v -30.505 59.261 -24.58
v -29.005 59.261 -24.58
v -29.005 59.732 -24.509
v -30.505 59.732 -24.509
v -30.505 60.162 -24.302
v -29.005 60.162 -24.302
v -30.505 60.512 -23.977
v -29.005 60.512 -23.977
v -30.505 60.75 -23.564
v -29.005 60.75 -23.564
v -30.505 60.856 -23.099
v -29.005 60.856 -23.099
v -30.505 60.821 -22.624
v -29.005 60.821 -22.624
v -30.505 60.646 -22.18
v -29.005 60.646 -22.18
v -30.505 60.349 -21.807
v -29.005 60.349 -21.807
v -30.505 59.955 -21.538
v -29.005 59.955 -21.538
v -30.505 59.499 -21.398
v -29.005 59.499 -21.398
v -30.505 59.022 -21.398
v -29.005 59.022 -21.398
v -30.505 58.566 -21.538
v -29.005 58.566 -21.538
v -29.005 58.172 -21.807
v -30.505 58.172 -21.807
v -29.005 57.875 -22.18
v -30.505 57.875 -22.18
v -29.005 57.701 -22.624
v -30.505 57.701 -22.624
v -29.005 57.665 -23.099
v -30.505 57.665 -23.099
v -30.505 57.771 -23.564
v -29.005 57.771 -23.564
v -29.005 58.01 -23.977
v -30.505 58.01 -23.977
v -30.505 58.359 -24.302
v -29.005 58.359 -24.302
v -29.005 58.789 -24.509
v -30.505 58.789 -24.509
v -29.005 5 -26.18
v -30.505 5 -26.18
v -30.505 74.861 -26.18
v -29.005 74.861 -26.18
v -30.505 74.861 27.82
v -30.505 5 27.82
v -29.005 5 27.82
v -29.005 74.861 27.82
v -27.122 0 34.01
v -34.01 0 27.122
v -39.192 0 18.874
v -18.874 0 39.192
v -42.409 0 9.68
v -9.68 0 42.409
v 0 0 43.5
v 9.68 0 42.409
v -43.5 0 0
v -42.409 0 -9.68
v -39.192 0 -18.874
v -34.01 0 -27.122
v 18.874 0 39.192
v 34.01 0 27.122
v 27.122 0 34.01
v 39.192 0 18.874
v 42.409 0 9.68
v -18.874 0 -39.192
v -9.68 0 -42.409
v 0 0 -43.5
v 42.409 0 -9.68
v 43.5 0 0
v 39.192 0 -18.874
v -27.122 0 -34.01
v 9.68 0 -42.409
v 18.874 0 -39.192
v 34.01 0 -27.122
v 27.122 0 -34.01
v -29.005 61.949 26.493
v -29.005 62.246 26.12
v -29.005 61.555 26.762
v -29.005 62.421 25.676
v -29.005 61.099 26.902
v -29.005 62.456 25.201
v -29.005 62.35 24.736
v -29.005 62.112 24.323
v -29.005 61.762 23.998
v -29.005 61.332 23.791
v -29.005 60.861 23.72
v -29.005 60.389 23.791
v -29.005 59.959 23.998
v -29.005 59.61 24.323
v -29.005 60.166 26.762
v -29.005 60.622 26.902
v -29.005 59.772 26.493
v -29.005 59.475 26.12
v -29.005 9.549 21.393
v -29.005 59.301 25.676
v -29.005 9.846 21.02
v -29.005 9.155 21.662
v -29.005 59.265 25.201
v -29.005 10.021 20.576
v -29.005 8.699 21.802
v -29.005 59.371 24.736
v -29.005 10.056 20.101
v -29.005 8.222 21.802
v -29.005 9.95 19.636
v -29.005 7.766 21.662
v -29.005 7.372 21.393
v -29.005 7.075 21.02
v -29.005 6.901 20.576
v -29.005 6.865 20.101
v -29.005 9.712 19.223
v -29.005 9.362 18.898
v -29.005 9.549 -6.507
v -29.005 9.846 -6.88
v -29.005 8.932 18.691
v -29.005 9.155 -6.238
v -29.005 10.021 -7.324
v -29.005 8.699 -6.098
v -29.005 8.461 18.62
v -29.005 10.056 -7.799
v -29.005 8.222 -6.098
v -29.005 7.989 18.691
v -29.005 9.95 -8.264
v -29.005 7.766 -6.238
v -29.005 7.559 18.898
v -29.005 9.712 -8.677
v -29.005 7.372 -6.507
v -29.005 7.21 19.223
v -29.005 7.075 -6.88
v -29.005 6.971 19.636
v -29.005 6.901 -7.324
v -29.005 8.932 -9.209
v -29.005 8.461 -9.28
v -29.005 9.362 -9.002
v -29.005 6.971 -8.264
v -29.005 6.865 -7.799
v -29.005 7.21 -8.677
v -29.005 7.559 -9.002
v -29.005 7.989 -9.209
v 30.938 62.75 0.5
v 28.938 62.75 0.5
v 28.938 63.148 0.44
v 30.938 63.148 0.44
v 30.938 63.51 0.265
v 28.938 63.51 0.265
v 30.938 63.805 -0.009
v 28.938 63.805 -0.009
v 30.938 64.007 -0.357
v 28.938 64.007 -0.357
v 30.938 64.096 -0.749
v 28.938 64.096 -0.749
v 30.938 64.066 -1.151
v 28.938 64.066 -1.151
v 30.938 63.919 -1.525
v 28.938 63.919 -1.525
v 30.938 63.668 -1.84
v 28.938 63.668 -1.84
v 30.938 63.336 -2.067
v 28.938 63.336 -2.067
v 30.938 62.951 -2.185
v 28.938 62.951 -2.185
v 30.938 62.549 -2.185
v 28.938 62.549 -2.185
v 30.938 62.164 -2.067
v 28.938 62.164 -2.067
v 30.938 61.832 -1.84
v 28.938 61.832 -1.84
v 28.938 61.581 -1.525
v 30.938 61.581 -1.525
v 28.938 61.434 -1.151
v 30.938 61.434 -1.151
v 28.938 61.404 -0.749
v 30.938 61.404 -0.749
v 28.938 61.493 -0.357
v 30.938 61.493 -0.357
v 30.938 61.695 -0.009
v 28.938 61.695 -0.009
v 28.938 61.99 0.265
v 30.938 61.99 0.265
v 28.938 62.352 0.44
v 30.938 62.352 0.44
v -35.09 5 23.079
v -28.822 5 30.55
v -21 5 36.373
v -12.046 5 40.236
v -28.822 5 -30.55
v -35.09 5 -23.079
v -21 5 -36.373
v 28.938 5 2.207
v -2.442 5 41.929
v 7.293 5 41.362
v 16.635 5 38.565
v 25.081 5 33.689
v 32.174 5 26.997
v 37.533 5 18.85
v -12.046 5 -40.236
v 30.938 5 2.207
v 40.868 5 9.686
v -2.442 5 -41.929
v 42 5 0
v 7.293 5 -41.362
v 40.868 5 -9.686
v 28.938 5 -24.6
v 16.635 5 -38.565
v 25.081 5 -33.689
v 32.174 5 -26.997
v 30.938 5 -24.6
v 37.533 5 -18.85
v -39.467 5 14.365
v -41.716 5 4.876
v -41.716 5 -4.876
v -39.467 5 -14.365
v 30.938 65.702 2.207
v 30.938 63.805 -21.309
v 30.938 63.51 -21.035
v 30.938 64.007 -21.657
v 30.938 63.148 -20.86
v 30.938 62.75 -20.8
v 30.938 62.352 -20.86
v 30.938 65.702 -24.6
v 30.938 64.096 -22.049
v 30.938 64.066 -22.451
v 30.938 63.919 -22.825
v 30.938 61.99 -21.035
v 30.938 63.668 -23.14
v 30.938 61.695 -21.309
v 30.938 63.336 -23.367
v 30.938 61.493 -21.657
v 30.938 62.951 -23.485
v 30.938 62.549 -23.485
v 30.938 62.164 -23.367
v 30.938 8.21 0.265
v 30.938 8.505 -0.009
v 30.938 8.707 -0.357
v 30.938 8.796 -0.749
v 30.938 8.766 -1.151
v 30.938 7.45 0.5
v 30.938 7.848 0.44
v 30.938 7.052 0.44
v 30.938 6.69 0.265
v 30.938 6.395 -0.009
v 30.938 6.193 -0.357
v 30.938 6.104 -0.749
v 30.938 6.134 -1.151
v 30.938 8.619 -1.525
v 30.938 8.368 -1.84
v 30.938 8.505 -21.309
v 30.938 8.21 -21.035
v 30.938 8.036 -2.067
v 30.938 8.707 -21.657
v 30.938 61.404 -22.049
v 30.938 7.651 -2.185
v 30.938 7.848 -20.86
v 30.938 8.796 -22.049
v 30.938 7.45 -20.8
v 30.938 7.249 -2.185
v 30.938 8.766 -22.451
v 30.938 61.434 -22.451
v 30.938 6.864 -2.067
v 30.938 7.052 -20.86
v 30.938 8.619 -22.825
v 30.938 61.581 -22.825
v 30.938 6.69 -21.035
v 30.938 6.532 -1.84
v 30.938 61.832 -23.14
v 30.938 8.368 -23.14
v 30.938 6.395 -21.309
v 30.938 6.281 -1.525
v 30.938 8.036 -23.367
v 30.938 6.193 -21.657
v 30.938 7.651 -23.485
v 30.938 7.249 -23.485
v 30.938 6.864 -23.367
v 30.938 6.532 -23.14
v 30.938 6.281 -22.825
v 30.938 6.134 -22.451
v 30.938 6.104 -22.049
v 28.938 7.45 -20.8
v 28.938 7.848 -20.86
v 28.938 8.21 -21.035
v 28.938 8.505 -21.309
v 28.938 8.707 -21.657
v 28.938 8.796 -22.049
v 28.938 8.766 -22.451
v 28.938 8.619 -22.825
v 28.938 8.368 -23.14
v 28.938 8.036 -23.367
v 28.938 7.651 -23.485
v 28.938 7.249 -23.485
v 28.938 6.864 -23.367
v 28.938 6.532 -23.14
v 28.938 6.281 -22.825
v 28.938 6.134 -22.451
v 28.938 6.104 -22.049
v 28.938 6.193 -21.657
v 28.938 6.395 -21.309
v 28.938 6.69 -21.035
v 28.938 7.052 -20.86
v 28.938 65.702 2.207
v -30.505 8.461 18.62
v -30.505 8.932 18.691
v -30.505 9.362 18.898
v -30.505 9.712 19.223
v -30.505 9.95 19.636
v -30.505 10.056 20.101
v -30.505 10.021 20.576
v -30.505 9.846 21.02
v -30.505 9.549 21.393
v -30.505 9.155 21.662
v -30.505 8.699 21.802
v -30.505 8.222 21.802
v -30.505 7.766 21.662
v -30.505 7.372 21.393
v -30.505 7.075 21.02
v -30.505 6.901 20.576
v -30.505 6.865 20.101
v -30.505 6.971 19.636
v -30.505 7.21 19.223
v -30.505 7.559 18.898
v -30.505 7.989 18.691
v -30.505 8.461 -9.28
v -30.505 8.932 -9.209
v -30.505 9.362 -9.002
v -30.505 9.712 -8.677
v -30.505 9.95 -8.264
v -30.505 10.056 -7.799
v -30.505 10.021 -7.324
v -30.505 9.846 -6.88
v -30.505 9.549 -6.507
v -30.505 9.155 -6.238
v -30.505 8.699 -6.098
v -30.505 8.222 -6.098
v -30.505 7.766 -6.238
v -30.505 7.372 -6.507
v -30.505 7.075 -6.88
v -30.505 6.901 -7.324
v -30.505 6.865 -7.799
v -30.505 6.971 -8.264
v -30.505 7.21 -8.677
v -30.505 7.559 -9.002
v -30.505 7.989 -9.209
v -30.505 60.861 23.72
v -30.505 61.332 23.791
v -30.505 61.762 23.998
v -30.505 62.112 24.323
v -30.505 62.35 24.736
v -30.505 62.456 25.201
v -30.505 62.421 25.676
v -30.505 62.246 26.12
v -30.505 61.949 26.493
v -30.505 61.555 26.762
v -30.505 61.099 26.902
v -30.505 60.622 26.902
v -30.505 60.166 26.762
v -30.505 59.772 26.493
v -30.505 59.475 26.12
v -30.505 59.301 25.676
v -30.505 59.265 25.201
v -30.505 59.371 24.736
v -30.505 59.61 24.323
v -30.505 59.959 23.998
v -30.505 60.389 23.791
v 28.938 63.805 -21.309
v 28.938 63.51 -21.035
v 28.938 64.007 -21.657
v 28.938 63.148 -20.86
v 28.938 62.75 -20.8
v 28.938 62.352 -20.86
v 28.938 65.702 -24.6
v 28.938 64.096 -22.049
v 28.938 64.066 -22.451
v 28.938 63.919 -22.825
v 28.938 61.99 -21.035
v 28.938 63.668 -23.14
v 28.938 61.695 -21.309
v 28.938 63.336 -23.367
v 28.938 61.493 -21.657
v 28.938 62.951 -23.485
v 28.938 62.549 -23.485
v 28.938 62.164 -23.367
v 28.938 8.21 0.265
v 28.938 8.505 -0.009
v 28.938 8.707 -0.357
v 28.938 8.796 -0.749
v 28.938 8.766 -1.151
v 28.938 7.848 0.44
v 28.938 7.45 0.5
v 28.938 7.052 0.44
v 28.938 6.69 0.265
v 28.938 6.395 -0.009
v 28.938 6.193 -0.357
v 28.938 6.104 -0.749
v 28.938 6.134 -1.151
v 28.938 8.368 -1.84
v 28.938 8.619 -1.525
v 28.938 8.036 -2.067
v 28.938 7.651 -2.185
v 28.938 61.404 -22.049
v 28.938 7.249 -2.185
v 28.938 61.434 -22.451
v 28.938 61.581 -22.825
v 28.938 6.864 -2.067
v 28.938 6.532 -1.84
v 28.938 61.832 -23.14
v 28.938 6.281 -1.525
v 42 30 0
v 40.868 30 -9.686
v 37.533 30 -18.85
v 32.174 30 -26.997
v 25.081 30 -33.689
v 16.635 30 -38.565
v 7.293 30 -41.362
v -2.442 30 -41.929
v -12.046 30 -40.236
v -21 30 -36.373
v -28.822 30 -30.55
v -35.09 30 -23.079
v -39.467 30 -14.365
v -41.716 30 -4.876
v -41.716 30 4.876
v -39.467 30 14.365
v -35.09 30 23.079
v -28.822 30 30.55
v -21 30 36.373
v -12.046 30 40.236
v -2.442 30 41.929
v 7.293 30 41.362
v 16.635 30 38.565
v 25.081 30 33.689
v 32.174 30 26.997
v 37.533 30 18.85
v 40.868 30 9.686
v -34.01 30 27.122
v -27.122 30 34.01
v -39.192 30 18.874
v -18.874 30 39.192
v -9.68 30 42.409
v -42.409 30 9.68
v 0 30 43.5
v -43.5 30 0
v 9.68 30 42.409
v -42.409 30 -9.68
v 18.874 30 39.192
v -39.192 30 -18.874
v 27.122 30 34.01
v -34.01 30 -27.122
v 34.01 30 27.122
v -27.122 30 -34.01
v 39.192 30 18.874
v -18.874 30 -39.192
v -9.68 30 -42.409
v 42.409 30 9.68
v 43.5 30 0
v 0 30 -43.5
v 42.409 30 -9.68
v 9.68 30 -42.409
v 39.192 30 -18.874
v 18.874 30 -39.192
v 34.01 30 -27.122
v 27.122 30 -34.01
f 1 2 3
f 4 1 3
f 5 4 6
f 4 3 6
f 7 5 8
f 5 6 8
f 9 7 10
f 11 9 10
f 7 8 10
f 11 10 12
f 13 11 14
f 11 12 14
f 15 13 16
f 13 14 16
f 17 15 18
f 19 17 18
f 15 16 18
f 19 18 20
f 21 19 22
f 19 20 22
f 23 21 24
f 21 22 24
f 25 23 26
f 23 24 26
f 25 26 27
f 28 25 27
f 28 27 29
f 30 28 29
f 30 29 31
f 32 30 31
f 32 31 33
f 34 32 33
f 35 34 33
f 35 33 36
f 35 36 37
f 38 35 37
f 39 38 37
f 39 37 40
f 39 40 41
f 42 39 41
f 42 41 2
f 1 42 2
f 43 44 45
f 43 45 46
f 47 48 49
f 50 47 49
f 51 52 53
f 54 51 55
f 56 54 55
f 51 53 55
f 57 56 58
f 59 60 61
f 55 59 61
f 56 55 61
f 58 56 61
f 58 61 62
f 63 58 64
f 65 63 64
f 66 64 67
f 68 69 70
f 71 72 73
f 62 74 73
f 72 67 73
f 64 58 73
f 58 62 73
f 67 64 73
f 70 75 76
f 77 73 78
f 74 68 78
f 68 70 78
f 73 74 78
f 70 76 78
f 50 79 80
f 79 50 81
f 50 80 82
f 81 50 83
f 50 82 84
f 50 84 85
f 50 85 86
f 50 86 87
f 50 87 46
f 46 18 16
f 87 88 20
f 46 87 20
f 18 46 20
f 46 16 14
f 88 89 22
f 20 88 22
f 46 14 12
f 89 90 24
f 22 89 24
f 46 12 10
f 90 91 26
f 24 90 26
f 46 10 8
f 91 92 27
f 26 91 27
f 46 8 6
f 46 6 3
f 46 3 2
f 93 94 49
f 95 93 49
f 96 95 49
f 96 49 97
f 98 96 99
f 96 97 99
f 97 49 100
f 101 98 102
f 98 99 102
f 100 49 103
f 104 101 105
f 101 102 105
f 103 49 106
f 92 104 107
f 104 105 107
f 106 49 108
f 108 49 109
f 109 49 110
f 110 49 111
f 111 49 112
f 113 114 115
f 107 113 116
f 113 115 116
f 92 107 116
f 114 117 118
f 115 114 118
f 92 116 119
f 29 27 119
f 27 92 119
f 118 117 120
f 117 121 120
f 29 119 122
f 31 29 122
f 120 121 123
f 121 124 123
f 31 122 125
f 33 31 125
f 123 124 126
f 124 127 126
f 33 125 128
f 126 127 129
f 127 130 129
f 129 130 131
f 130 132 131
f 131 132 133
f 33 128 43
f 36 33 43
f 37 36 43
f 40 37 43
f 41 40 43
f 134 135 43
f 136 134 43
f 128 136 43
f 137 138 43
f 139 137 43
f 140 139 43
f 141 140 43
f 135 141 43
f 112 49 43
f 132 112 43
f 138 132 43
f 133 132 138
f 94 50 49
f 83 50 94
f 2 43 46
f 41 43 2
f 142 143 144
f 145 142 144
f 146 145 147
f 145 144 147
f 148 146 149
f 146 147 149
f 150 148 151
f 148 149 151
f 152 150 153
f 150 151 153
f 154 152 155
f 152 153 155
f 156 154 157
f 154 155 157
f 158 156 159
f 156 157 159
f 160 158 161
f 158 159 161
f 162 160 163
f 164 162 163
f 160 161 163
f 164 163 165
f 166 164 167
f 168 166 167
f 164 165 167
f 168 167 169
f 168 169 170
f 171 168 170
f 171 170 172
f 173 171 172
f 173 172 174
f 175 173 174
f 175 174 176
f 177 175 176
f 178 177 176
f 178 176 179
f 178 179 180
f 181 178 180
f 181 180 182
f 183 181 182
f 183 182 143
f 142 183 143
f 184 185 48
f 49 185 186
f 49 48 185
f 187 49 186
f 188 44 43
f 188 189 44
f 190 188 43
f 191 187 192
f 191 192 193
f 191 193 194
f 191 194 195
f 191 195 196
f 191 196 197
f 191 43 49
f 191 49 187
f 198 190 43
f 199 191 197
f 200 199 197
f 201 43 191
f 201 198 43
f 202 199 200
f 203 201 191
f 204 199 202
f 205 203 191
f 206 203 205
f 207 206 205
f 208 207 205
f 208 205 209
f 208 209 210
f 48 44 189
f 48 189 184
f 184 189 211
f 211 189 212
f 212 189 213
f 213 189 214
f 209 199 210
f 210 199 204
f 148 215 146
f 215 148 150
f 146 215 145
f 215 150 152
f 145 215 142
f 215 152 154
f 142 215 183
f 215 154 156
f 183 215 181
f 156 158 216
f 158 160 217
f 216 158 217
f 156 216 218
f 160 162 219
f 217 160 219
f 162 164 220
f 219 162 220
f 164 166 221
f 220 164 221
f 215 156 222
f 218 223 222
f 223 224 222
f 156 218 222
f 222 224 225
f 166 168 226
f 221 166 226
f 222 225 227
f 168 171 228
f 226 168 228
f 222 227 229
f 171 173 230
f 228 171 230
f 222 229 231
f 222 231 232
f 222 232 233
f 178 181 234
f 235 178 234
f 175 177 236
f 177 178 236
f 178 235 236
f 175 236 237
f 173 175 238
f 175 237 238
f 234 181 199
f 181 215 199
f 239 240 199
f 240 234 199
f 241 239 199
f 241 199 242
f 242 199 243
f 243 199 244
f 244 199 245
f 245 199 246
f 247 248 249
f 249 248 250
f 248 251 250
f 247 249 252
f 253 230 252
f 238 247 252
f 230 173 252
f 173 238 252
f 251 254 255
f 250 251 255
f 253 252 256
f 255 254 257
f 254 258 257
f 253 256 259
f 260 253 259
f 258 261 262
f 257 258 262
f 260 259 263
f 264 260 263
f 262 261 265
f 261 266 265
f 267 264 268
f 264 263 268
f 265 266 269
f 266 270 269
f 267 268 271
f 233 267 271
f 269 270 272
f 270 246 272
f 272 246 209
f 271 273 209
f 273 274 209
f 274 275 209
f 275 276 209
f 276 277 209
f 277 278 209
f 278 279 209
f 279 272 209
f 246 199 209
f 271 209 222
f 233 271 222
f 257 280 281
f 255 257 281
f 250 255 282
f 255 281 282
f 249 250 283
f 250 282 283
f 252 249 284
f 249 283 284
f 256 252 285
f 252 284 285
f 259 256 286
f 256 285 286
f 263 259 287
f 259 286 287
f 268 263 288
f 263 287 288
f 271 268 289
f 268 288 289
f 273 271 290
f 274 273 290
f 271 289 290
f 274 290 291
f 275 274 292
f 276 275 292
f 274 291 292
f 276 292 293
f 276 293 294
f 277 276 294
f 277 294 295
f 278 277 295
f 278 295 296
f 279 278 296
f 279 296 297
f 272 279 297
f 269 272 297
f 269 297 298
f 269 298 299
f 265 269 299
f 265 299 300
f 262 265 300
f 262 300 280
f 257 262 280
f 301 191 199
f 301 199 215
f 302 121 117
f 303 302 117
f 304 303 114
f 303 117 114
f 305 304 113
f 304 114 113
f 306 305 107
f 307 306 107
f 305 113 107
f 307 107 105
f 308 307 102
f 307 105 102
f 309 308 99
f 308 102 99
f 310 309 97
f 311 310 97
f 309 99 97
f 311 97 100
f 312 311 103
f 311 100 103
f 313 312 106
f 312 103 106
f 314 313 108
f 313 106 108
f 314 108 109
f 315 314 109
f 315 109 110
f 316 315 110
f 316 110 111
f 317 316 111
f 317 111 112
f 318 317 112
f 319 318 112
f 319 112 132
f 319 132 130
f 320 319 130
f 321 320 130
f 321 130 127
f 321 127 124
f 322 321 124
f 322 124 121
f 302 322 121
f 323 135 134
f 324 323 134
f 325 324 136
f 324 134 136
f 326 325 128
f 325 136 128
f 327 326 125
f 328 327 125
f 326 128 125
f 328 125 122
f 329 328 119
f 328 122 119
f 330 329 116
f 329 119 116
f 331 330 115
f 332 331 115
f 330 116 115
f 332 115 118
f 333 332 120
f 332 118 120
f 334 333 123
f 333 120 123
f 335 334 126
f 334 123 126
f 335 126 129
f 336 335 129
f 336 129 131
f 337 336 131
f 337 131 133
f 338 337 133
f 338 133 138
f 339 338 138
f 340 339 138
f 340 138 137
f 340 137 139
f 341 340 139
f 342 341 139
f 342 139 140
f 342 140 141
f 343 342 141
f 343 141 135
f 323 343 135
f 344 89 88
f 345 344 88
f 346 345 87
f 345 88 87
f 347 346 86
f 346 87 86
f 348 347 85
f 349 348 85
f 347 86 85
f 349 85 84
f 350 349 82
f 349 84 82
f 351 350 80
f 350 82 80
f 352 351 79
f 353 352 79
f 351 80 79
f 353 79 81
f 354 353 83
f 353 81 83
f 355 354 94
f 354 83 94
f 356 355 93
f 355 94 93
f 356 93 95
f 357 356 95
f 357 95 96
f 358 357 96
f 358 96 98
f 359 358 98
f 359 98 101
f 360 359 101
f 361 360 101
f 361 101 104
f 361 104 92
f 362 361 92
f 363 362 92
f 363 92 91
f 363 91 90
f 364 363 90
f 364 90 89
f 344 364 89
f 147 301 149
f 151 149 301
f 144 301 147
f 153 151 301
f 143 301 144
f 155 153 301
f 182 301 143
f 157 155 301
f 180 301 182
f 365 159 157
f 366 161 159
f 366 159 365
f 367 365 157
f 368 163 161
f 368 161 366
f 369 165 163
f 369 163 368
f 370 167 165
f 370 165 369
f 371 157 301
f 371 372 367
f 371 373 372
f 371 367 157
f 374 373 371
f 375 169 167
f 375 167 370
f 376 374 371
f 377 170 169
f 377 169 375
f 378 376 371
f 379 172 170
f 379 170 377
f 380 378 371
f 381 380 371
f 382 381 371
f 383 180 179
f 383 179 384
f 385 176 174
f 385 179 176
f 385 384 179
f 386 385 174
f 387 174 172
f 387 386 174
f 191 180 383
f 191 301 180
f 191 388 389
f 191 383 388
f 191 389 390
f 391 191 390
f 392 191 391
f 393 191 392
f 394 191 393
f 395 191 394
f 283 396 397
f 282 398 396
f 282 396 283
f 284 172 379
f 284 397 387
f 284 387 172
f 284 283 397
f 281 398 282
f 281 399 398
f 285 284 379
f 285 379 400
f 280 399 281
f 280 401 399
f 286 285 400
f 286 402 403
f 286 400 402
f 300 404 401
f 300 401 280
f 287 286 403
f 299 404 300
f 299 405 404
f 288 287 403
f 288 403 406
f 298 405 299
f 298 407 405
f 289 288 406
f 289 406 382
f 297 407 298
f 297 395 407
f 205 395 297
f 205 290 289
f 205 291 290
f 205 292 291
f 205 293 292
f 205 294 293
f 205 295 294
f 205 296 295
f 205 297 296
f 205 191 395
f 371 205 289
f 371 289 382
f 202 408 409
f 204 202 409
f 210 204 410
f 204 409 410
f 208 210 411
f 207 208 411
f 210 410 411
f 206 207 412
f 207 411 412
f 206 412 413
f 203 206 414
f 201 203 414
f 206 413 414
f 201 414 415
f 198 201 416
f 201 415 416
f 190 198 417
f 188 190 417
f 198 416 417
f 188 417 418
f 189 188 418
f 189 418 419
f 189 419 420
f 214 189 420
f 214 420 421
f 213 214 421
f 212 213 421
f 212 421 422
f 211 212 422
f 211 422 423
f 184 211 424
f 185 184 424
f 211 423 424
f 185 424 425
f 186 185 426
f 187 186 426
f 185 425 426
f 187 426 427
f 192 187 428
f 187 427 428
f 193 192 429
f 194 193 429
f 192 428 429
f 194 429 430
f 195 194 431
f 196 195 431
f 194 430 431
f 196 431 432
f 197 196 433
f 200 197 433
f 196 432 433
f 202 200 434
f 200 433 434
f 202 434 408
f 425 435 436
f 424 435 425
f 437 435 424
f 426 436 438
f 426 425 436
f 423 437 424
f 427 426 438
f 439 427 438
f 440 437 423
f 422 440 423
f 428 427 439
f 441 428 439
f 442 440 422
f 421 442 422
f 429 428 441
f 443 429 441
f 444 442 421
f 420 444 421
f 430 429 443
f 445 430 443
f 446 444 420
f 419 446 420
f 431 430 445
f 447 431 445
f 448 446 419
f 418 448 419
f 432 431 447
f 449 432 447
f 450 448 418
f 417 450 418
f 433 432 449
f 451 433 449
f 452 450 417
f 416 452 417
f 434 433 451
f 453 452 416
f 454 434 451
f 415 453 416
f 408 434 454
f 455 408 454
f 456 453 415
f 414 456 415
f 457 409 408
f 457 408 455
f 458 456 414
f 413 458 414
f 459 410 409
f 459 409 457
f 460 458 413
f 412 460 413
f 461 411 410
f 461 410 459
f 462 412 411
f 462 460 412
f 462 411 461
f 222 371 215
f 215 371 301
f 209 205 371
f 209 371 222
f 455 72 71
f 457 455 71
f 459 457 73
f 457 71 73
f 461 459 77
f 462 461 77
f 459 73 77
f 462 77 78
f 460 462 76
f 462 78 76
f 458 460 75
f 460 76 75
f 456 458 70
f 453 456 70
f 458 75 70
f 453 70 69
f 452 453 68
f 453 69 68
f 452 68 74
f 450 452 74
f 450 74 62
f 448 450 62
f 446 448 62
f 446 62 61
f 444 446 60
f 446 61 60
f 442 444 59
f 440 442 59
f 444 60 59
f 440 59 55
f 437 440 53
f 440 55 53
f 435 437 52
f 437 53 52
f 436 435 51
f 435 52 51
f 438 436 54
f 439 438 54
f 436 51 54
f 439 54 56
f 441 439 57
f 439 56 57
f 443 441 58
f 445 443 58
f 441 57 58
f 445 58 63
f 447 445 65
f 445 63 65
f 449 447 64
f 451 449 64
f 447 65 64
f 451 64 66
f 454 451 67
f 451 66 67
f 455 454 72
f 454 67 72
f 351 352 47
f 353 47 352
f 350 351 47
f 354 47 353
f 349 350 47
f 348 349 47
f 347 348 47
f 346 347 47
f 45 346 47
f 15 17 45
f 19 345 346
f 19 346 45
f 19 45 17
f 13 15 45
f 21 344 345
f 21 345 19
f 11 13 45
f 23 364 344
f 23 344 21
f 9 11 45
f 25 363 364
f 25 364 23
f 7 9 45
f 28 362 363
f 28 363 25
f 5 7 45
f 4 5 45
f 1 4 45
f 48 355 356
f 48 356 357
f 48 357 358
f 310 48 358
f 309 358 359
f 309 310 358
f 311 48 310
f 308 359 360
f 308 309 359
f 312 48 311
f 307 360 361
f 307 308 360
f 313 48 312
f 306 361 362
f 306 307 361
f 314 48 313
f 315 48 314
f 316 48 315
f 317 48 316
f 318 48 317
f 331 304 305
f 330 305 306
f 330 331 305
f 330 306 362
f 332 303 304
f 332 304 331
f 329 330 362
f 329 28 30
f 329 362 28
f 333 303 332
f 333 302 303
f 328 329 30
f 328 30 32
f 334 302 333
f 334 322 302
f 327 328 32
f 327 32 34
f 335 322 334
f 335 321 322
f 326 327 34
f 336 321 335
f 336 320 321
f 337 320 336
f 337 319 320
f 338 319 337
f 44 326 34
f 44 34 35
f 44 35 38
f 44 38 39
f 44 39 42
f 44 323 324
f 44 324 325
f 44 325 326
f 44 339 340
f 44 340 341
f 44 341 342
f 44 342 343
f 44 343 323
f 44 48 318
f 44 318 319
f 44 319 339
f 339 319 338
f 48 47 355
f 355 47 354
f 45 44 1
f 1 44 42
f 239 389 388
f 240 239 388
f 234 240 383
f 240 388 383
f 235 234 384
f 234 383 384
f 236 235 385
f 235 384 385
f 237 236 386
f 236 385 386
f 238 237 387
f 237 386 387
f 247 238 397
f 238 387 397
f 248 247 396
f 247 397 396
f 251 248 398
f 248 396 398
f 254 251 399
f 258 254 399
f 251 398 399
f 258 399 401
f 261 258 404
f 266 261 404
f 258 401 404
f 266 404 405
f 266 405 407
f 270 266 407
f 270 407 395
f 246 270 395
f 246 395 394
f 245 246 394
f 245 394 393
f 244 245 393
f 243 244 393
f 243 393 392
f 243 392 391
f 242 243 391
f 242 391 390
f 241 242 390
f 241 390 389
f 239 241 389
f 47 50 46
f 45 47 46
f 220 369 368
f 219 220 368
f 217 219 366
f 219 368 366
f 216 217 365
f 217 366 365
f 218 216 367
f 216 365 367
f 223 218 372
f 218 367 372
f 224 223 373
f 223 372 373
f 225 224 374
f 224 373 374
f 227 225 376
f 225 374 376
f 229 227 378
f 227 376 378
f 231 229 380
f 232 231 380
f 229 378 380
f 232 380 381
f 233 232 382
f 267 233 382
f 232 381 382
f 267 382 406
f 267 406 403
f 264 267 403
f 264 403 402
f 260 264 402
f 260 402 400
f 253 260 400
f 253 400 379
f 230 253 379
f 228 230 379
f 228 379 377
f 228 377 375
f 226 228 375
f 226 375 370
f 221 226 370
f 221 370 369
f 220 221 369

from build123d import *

# Parameters (mm, degrees)
SKETCH1_R               = 43.5
BOSS_EXTRUDE1_DEPTH     = 30
SKETCH2_R               = 42
CUT_EXTRUDE1_DEPTH      = 1
CUT_EXTRUDE1_DEPTH_BACK = 25
SKETCH6_W               = 1.5
SKETCH6_H               = 54
BOSS_EXTRUDE4_DEPTH     = 80
SKETCH7_W               = 54
SKETCH7_H               = 6.26870776
CUT_EXTRUDE2_DEPTH      = 15.49497474
SKETCH8_W               = 54
SKETCH8_H               = 3.87063504
CUT_EXTRUDE3_DEPTH      = 15.49497474
CUT_EXTRUDE5_REACH      = 16.495
SKETCH9_R               = 1.6
SKETCH10_W              = 2
SKETCH10_H              = 28.990761916
BOSS_EXTRUDE5_DEPTH     = 67
CUT_EXTRUDE6_REACH      = 16.562
SKETCH11_W              = 28.990761916
SKETCH11_H              = 6.298062211
CUT_EXTRUDE7_REACH      = 16.562
SKETCH12_W              = 2.183875445
SKETCH12_H              = 60.701937789
CUT_EXTRUDE8_REACH      = 16.562
SKETCH13_R              = 1.35


with BuildPart() as part:
    # Sketch1 → Boss-Extrude1 (new body)
    with BuildSketch(Plane(origin=(0, 0, 0), x_dir=(1, 0, 0), z_dir=(0, 1, 0))):
        Circle(SKETCH1_R)
    extrude(amount=BOSS_EXTRUDE1_DEPTH)

    # Sketch2 → Cut-Extrude1 (cut, two sides)
    with BuildSketch(Plane(origin=(0, 30, 0), x_dir=(1, 0, 0), z_dir=(0, 1, 0))) as cut_extrude1_sk:
        Circle(SKETCH2_R)
    extrude(amount=CUT_EXTRUDE1_DEPTH, mode=Mode.SUBTRACT)
    extrude(cut_extrude1_sk.sketch, amount=-CUT_EXTRUDE1_DEPTH_BACK, mode=Mode.SUBTRACT)

    # Sketch6 → Boss-Extrude4 (add)
    with BuildSketch(Plane(origin=(0, 5, 0), x_dir=(1, 0, 0), z_dir=(0, 1, 0))):
        with Locations((-29.75502526, -0.820126033)):
            Rectangle(SKETCH6_W, SKETCH6_H)
    extrude(amount=BOSS_EXTRUDE4_DEPTH)

    # Sketch7 → Cut-Extrude2 (cut, through all)
    with BuildSketch(Plane(origin=(-29.00502526, 0, 0), x_dir=(0, 0, -1), z_dir=(1, 0, 0))):
        with Locations((-0.820126033, 81.86564612)):
            Rectangle(SKETCH7_W, SKETCH7_H)
    extrude(amount=-CUT_EXTRUDE2_DEPTH, mode=Mode.SUBTRACT)

    # Sketch8 → Cut-Extrude3 (cut, through all)
    with BuildSketch(Plane(origin=(-29.00502526, 0, 0), x_dir=(0, 0, -1), z_dir=(1, 0, 0))):
        with Locations((-0.820126033, 76.79597472)):
            Rectangle(SKETCH8_W, SKETCH8_H)
    extrude(amount=-CUT_EXTRUDE3_DEPTH, mode=Mode.SUBTRACT)

    # Sketch9 → Cut-Extrude5 (cut, up to next)
    with BuildSketch(Plane(origin=(-29.00502526, 0, 0), x_dir=(0, 0, -1), z_dir=(1, 0, 0)), mode=Mode.PRIVATE) as cut_extrude5_sk1:
        with Locations((-25.320126033, 60.8606572)):
            Circle(SKETCH9_R)
    cut_extrude5_tool1 = extrude(cut_extrude5_sk1.sketch, amount=-CUT_EXTRUDE5_REACH, mode=Mode.PRIVATE) & part.part
    add(cut_extrude5_tool1.solids().sort_by_distance((-29.005025, 60.860657, 25.320126))[0], mode=Mode.SUBTRACT)
    # Sketch9 → Cut-Extrude5 (cut, up to next)
    with BuildSketch(Plane(origin=(-29.00502526, 0, 0), x_dir=(0, 0, -1), z_dir=(1, 0, 0)), mode=Mode.PRIVATE) as cut_extrude5_sk2:
        with Locations((22.979873967, 59.2606572)):
            Circle(SKETCH9_R)
    cut_extrude5_tool2 = extrude(cut_extrude5_sk2.sketch, amount=-CUT_EXTRUDE5_REACH, mode=Mode.PRIVATE) & part.part
    add(cut_extrude5_tool2.solids().sort_by_distance((-29.005025, 59.260657, -22.979874))[0], mode=Mode.SUBTRACT)
    # Sketch9 → Cut-Extrude5 (cut, up to next)
    with BuildSketch(Plane(origin=(-29.00502526, 0, 0), x_dir=(0, 0, -1), z_dir=(1, 0, 0)), mode=Mode.PRIVATE) as cut_extrude5_sk3:
        with Locations((7.679873967, 8.4606572)):
            Circle(SKETCH9_R)
    cut_extrude5_tool3 = extrude(cut_extrude5_sk3.sketch, amount=-CUT_EXTRUDE5_REACH, mode=Mode.PRIVATE) & part.part
    add(cut_extrude5_tool3.solids().sort_by_distance((-29.005025, 8.460657, -7.679874))[0], mode=Mode.SUBTRACT)
    # Sketch9 → Cut-Extrude5 (cut, up to next)
    with BuildSketch(Plane(origin=(-29.00502526, 0, 0), x_dir=(0, 0, -1), z_dir=(1, 0, 0)), mode=Mode.PRIVATE) as cut_extrude5_sk4:
        with Locations((-20.220126033, 8.4606572)):
            Circle(SKETCH9_R)
    cut_extrude5_tool4 = extrude(cut_extrude5_sk4.sketch, amount=-CUT_EXTRUDE5_REACH, mode=Mode.PRIVATE) & part.part
    add(cut_extrude5_tool4.solids().sort_by_distance((-29.005025, 8.460657, 20.220126))[0], mode=Mode.SUBTRACT)

    # Sketch10 → Boss-Extrude5 (add)
    with BuildSketch(Plane(origin=(0, 5, 0), x_dir=(1, 0, 0), z_dir=(0, 1, 0))):
        with Locations((29.938305356, 10.104953072)):
            Rectangle(SKETCH10_W, SKETCH10_H)
    extrude(amount=BOSS_EXTRUDE5_DEPTH)

    # Sketch11 → Cut-Extrude6 (cut, up to next)
    with BuildSketch(Plane.ZY.offset(-28.938305356), mode=Mode.PRIVATE) as cut_extrude6_sk1:
        with Locations((-10.104953072, 68.850968894)):
            Rectangle(SKETCH11_W, SKETCH11_H)
    cut_extrude6_tool1 = extrude(cut_extrude6_sk1.sketch, amount=-CUT_EXTRUDE6_REACH, mode=Mode.PRIVATE) & part.part
    add(cut_extrude6_tool1.solids().sort_by_distance((28.938305, 68.850969, -10.104953))[0], mode=Mode.SUBTRACT)

    # Sketch12 → Cut-Extrude7 (cut, up to next)
    with BuildSketch(Plane.ZY.offset(-28.938305356), mode=Mode.PRIVATE) as cut_extrude7_sk1:
        with Locations((3.298490164, 35.350968894)):
            Rectangle(SKETCH12_W, SKETCH12_H)
    cut_extrude7_tool1 = extrude(cut_extrude7_sk1.sketch, amount=-CUT_EXTRUDE7_REACH, mode=Mode.PRIVATE) & part.part
    add(cut_extrude7_tool1.solids().sort_by_distance((28.938305, 35.350969, 3.29849))[0], mode=Mode.SUBTRACT)

    # Sketch13 → Cut-Extrude8 (cut, up to next)
    with BuildSketch(Plane.ZY.offset(-28.938305356), mode=Mode.PRIVATE) as cut_extrude8_sk1:
        with Locations((-22.15033403, 62.75)):
            Circle(SKETCH13_R)
    cut_extrude8_tool1 = extrude(cut_extrude8_sk1.sketch, amount=-CUT_EXTRUDE8_REACH, mode=Mode.PRIVATE) & part.part
    add(cut_extrude8_tool1.solids().sort_by_distance((28.938305, 62.75, -22.150334))[0], mode=Mode.SUBTRACT)
    # Sketch13 → Cut-Extrude8 (cut, up to next)
    with BuildSketch(Plane.ZY.offset(-28.938305356), mode=Mode.PRIVATE) as cut_extrude8_sk2:
        with Locations((-0.85033403, 62.75)):
            Circle(SKETCH13_R)
    cut_extrude8_tool2 = extrude(cut_extrude8_sk2.sketch, amount=-CUT_EXTRUDE8_REACH, mode=Mode.PRIVATE) & part.part
    add(cut_extrude8_tool2.solids().sort_by_distance((28.938305, 62.75, -0.850334))[0], mode=Mode.SUBTRACT)
    # Sketch13 → Cut-Extrude8 (cut, up to next)
    with BuildSketch(Plane.ZY.offset(-28.938305356), mode=Mode.PRIVATE) as cut_extrude8_sk3:
        with Locations((-22.15033403, 7.45)):
            Circle(SKETCH13_R)
    cut_extrude8_tool3 = extrude(cut_extrude8_sk3.sketch, amount=-CUT_EXTRUDE8_REACH, mode=Mode.PRIVATE) & part.part
    add(cut_extrude8_tool3.solids().sort_by_distance((28.938305, 7.45, -22.150334))[0], mode=Mode.SUBTRACT)
    # Sketch13 → Cut-Extrude8 (cut, up to next)
    with BuildSketch(Plane.ZY.offset(-28.938305356), mode=Mode.PRIVATE) as cut_extrude8_sk4:
        with Locations((-0.85033403, 7.45)):
            Circle(SKETCH13_R)
    cut_extrude8_tool4 = extrude(cut_extrude8_sk4.sketch, amount=-CUT_EXTRUDE8_REACH, mode=Mode.PRIVATE) & part.part
    add(cut_extrude8_tool4.solids().sort_by_distance((28.938305, 7.45, -0.850334))[0], mode=Mode.SUBTRACT)


solid = part.part
